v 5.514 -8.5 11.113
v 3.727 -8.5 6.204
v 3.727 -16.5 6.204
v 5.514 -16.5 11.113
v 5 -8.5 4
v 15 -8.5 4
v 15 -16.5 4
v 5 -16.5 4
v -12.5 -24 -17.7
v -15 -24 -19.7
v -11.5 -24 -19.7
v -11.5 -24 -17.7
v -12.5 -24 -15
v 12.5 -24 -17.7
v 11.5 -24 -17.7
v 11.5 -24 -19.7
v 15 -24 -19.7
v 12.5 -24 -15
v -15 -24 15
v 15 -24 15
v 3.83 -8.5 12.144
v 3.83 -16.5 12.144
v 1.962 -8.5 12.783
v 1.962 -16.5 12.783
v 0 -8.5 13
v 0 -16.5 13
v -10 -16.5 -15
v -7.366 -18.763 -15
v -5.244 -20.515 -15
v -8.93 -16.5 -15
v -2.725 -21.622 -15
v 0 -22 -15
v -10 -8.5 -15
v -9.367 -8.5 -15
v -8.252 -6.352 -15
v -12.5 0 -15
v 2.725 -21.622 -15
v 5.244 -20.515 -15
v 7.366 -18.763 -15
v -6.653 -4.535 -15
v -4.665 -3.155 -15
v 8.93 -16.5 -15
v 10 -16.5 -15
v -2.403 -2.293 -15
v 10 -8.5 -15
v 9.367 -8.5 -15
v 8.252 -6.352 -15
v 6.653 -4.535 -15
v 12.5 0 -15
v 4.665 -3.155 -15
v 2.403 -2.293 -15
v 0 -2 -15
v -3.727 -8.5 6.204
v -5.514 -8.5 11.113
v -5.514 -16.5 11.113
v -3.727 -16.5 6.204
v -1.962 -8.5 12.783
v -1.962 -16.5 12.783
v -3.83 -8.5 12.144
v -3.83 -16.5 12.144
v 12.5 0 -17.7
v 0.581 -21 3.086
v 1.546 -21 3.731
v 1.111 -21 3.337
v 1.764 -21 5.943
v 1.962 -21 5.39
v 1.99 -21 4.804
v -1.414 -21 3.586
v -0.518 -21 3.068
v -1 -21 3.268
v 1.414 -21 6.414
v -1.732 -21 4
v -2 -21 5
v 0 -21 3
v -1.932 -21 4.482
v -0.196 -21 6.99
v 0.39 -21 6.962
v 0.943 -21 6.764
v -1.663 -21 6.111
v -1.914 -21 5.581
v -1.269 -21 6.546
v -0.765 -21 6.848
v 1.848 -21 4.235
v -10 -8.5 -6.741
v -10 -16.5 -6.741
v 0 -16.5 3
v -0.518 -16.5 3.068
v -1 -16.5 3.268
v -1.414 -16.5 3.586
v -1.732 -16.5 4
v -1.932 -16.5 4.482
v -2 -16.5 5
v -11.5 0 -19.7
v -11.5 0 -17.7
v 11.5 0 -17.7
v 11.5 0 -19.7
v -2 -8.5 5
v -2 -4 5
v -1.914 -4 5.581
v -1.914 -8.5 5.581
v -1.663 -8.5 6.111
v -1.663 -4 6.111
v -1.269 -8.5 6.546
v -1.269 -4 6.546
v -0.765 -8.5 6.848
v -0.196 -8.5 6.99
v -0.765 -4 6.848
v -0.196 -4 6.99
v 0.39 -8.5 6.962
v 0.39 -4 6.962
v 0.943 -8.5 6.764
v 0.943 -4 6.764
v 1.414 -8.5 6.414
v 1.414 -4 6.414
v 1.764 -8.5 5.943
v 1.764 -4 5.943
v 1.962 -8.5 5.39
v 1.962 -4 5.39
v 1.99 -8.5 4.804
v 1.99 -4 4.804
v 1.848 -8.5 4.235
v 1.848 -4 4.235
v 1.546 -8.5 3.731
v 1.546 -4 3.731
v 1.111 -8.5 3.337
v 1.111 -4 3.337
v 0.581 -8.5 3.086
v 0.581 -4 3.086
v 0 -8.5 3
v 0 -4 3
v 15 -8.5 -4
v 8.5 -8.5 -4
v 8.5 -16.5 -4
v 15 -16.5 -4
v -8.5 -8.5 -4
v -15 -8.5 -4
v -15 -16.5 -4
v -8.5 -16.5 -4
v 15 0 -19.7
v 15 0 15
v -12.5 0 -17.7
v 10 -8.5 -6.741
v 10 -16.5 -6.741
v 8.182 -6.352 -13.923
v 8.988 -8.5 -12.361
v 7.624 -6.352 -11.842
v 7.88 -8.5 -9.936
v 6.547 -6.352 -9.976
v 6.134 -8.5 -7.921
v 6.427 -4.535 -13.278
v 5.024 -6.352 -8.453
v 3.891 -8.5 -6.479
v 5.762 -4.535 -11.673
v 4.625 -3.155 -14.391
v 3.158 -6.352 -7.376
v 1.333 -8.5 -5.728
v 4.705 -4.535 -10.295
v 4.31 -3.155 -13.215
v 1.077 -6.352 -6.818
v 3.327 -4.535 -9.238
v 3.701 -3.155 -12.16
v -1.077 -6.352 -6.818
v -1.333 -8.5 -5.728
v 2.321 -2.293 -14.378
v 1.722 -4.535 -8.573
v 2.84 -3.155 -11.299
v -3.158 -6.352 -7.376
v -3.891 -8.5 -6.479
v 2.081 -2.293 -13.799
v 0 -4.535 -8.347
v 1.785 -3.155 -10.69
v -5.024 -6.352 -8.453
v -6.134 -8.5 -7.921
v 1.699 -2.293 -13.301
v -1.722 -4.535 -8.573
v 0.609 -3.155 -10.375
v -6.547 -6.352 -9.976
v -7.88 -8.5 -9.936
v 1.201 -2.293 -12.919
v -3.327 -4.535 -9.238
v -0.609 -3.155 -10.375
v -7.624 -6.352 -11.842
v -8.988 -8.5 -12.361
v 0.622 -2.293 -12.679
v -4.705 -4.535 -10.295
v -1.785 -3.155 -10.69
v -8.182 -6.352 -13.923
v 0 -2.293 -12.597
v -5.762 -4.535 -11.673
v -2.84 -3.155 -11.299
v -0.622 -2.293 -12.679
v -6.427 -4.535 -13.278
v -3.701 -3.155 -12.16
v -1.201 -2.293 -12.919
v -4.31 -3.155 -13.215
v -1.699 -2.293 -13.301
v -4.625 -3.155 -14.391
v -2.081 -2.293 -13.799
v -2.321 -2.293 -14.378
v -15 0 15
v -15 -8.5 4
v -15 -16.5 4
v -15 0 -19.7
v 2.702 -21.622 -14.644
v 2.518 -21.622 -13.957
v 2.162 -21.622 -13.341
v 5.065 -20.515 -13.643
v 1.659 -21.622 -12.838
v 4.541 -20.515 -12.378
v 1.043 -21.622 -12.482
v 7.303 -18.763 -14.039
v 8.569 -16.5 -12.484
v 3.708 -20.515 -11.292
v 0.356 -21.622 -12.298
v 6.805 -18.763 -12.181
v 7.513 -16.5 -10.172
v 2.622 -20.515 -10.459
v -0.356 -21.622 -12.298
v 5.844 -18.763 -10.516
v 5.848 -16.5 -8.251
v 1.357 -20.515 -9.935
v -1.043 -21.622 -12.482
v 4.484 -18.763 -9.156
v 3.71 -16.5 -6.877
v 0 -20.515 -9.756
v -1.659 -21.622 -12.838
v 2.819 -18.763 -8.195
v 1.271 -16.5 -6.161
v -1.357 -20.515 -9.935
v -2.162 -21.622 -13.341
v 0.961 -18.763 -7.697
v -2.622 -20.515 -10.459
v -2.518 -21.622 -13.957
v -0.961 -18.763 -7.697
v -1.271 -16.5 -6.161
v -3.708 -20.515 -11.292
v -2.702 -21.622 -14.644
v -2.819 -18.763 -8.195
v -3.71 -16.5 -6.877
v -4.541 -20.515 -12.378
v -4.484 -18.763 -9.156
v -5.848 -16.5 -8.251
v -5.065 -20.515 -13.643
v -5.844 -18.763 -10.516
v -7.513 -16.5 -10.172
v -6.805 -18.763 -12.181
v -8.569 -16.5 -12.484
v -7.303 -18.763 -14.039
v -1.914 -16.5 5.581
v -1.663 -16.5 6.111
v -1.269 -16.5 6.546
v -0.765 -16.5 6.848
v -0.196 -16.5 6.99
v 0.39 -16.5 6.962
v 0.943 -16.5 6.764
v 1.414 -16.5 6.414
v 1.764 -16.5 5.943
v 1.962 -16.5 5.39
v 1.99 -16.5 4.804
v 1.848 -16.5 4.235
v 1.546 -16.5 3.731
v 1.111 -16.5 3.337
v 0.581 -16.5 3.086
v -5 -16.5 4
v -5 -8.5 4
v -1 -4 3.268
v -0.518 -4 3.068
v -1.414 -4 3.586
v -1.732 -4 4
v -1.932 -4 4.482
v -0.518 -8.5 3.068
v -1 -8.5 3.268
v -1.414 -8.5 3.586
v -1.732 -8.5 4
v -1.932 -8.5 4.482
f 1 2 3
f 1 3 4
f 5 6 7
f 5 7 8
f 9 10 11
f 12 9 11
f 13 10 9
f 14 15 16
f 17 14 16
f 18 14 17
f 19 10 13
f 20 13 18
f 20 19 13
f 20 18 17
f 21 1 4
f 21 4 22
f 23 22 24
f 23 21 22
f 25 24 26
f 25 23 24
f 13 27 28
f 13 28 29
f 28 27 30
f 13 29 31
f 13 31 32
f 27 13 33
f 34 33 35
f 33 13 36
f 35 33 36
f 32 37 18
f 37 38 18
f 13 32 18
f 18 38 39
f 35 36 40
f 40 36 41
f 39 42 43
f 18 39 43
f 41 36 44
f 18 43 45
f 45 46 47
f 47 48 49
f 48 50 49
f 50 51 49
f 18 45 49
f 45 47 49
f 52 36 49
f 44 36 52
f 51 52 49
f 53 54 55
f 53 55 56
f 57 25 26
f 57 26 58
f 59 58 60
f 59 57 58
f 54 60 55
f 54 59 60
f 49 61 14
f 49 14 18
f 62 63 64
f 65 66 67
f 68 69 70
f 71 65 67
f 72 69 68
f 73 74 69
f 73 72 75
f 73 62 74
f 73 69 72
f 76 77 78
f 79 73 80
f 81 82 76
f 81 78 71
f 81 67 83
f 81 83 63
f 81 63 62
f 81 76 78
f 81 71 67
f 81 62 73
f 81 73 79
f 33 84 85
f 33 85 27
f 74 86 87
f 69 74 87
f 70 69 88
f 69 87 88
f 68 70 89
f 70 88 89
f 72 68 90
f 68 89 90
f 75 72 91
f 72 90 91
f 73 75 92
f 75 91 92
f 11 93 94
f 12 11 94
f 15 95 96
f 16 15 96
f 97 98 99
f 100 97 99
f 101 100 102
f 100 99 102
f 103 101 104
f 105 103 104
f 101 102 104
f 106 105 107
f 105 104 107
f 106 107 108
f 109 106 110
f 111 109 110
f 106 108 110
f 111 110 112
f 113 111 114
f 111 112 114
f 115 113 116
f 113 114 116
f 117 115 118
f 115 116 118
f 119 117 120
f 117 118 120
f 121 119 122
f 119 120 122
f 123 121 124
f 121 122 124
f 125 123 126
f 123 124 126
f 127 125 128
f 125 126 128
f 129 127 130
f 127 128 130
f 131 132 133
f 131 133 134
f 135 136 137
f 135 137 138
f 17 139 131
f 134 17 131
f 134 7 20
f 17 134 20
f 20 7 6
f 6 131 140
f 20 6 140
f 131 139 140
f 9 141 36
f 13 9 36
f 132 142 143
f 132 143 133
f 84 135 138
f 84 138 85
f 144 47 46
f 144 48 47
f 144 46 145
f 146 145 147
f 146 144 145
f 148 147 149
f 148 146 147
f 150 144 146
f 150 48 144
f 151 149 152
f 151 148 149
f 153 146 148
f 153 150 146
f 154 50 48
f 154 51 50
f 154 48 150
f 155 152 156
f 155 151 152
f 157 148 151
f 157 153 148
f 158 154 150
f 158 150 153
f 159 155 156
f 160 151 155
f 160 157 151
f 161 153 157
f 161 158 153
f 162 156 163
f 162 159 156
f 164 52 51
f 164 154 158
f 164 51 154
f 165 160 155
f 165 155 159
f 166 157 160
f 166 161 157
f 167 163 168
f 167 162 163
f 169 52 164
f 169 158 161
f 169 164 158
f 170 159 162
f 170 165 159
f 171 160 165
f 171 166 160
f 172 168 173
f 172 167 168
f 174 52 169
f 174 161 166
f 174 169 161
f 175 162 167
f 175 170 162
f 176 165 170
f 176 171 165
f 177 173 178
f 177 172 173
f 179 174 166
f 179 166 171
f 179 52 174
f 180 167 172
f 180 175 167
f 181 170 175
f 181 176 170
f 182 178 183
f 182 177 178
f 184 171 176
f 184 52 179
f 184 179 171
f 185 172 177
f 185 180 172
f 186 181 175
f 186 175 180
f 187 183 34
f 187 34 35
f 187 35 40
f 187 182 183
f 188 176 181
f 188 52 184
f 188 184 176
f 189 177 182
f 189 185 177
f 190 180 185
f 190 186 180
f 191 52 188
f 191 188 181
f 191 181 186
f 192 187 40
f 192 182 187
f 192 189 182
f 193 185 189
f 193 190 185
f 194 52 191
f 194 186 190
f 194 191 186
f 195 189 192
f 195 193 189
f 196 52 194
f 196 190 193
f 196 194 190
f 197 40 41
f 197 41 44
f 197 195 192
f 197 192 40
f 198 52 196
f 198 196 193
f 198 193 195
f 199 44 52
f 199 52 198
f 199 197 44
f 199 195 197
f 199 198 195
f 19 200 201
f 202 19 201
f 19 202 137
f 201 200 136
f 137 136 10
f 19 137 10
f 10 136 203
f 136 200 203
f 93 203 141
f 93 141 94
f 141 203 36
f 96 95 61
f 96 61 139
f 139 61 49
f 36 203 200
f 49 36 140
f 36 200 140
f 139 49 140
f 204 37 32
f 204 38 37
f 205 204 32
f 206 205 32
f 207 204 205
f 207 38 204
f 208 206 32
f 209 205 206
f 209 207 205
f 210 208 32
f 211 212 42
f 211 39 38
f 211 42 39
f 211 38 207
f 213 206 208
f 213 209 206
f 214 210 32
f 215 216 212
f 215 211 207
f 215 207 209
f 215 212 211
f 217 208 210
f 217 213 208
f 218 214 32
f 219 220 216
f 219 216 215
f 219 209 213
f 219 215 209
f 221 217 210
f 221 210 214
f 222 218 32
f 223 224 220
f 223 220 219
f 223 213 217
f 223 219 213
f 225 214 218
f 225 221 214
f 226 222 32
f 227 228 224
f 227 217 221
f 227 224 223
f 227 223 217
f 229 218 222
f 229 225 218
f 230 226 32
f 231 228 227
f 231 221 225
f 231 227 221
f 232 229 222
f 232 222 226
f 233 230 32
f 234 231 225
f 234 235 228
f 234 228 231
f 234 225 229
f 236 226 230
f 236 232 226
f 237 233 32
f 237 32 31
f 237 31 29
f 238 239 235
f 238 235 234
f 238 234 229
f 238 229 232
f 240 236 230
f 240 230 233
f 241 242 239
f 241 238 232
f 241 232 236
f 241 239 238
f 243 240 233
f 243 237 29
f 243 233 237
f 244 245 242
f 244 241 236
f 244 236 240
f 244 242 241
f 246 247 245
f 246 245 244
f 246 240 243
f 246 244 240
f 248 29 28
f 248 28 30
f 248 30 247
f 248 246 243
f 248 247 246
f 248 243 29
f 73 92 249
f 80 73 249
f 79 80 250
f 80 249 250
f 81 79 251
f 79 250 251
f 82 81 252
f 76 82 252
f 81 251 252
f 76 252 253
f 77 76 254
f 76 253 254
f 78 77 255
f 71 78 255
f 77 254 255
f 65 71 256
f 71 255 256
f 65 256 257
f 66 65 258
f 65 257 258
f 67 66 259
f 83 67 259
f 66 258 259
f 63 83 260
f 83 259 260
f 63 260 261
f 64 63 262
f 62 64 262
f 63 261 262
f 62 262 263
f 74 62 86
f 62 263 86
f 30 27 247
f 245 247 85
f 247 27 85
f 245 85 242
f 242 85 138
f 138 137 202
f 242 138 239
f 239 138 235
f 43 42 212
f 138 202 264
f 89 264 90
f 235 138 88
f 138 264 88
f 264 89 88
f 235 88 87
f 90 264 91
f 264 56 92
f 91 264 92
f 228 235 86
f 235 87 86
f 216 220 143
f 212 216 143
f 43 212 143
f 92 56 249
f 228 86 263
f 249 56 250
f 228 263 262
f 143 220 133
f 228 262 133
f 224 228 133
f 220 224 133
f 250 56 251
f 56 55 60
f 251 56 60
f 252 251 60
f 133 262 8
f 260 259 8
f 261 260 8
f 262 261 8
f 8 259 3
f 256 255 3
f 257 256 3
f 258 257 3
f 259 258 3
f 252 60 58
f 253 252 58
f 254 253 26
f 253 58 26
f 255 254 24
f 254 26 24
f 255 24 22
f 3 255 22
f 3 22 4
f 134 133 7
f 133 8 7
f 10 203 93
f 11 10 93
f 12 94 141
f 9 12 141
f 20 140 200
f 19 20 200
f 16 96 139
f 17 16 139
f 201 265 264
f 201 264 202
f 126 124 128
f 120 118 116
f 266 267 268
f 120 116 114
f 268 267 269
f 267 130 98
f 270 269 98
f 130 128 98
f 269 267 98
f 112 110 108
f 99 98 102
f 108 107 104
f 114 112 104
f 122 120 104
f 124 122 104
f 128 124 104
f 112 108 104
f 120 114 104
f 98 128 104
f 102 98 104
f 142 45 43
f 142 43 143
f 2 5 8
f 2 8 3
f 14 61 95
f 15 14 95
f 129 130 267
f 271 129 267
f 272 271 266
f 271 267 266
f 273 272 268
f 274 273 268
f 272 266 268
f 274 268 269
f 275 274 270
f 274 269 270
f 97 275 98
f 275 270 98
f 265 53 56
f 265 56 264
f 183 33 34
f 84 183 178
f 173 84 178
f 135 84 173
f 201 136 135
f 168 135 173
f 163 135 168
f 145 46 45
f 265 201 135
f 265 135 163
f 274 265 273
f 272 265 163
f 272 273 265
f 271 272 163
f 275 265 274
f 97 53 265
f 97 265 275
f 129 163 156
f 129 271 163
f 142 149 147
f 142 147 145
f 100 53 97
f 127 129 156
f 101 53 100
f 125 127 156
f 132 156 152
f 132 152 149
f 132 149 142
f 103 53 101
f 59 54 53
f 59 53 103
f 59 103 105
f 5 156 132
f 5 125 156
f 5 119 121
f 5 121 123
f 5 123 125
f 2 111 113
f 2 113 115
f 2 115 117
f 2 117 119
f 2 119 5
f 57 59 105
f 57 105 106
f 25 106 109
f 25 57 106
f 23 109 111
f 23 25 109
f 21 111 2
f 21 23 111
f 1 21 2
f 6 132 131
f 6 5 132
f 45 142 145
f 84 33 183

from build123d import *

# Parameters (mm, degrees)
F0_W     = 5
F0_H     = 8
F0_H_2   = 11
F0_W_2   = 2.5
F0_H_3   = 2.7
F0_W_3   = 1.5
F1_DEPTH = 24
F4_START = 8.5
F4_DEPTH = 8
F6_START = -4
F6_DEPTH = 17


with BuildPart() as f1:
    # F0 (on Front) → F1 (new body)
    with BuildSketch(Plane.XZ):
        with Locations((-12.5, 0)):
            Rectangle(F0_W, F0_H)
        with Locations((12.5, 9.5)):
            Rectangle(F0_W, F0_H_2)
        with BuildLine():
            Line((10, 4), (10, 15))
            Line((10, 15), (0, 15))
            Line((0, 15), (0, 13))
            ThreePointArc((0, 13), (2.9140227369, 12.5151906314), (5.5141020242, 11.1129936642))
            Line((5.5141020242, 11.1129936642), (3.727430731, 6.2041546301))
            Line((3.727430731, 6.2041546301), (5, 4))
            Line((5, 4), (8.5, 4))
            Line((8.5, 4), (10, 4))
        make_face()
        Polygon((0, 0), (0, 1.9517640748), (-8.5, -4), (0, -4), align=None)
        Polygon((15, -19.7), (15, -17.7), (12.5, -17.7), (11.5, -17.7), (11.5, -19.7), align=None)
        Polygon((0, -4), (8.5, -4), (0, 1.9517640748), (0, 0), align=None)
        Polygon((10, -6.7414640249), (10, -4), (8.5, -4), align=None)
        with BuildLine():
            Line((0, 13), (0, 15))
            Line((0, 15), (-10, 15))
            Line((-10, 15), (-10, 4))
            Line((-10, 4), (-8.5, 4))
            Line((-8.5, 4), (-5, 4))
            Line((-5, 4), (-3.727430731, 6.2041546301))
            Line((-3.727430731, 6.2041546301), (-5.5141020242, 11.1129936642))
            ThreePointArc((-5.5141020242, 11.1129936642), (-2.9140227369, 12.5151906314), (0, 13))
        make_face()
        with Locations((13.75, -16.35)):
            Rectangle(F0_W_2, F0_H_3)
        Polygon((10, -6.7414640249), (8.5, -4), (0, -4), (0, -15), (10, -15), align=None)
        Polygon((15, -15), (15, -4), (10, -4), (10, -6.7414640249), (10, -15), (12.5, -15), align=None)
        Polygon((0, -15), (0, -4), (-8.5, -4), (-10, -6.7414640249), (-10, -15), align=None)
        with BuildLine():
            ThreePointArc((5.5141020242, 11.1129936642), (2.9140227369, 12.5151906314), (0, 13))
            Line((0, 13), (0, 4))
            Line((0, 4), (2.9251840539, 4))
            Line((2.9251840539, 4), (3.727430731, 6.2041546301))
            Line((3.727430731, 6.2041546301), (5.5141020242, 11.1129936642))
        make_face()
        with BuildLine():
            Line((0, 4), (0, 13))
            ThreePointArc((0, 13), (-2.9140227369, 12.5151906314), (-5.5141020242, 11.1129936642))
            Line((-5.5141020242, 11.1129936642), (-3.727430731, 6.2041546301))
            Line((-3.727430731, 6.2041546301), (-2.9251840539, 4))
            Line((-2.9251840539, 4), (0, 4))
        make_face()
        with Locations((12.5, 0)):
            Rectangle(F0_W, F0_H)
        Polygon((-11.5, -19.7), (-11.5, -17.7), (-12.5, -17.7), (-15, -17.7), (-15, -19.7), align=None)
        with Locations((9.25, 0)):
            Rectangle(F0_W_3, F0_H)
        Polygon((-5, 4), (-2.9251840539, 4), (-3.727430731, 6.2041546301), align=None)
        with Locations((-13.75, -16.35)):
            Rectangle(F0_W_2, F0_H_3)
        with Locations((-12.5, 9.5)):
            Rectangle(F0_W, F0_H_2)
        Polygon((-8.5, -4), (-10, -4), (-10, -6.7414640249), align=None)
        Polygon((8.5, -4), (8.5, 4), (5, 4), (2.9251840539, 4), (0, 1.9517640748), align=None)
        Polygon((-5, 4), (-8.5, 4), (-8.5, -4), (0, 1.9517640748), (-2.9251840539, 4), align=None)
        Polygon((2.9251840539, 4), (5, 4), (3.727430731, 6.2041546301), align=None)
        Polygon((2.9251840539, 4), (0, 4), (0, 1.9517640748), align=None)
        Polygon((0, 1.9517640748), (0, 4), (-2.9251840539, 4), align=None)
        with Locations((-9.25, 0)):
            Rectangle(F0_W_3, F0_H)
        Polygon((-10, -6.7414640249), (-10, -4), (-15, -4), (-15, -15), (-12.5, -15), (-10, -15), align=None)
    extrude(amount=F1_DEPTH)

    # F2 (on face) → F3 (revolve, cut)
    with BuildSketch(Plane(origin=(0, 0, -15), x_dir=(1, 0, 0), z_dir=(0, 0, -1))):
        with BuildLine():
            ThreePointArc((0, 22), (-10, 12), (0, 2))
            Line((0, 2), (0, 12))
            Line((0, 12), (0, 22))
        make_face()
    revolve(axis=Axis((0, -6, -15), (0, -1, 0)), mode=Mode.SUBTRACT)

    # F0 (on Front) → F4 (cut)
    with BuildSketch(Plane.XZ.offset(F4_START)):
        Polygon((10, -6.7414640249), (8.5, -4), (0, -4), (0, -15), (10, -15), align=None)
        Polygon((0, -4), (8.5, -4), (0, 1.9517640748), (0, 0), align=None)
        Polygon((8.5, -4), (8.5, 4), (5, 4), (2.9251840539, 4), (0, 1.9517640748), align=None)
        Polygon((2.9251840539, 4), (0, 4), (0, 1.9517640748), align=None)
        Polygon((0, 1.9517640748), (0, 4), (-2.9251840539, 4), align=None)
        Polygon((0, 0), (0, 1.9517640748), (-8.5, -4), (0, -4), align=None)
        Polygon((-5, 4), (-8.5, 4), (-8.5, -4), (0, 1.9517640748), (-2.9251840539, 4), align=None)
        with Locations((-9.25, 0)):
            Rectangle(F0_W_3, F0_H)
        with Locations((-12.5, 0)):
            Rectangle(F0_W, F0_H)
        with Locations((9.25, 0)):
            Rectangle(F0_W_3, F0_H)
        with Locations((12.5, 0)):
            Rectangle(F0_W, F0_H)
        with BuildLine():
            ThreePointArc((5.5141020242, 11.1129936642), (2.9140227369, 12.5151906314), (0, 13))
            Line((0, 13), (0, 4))
            Line((0, 4), (2.9251840539, 4))
            Line((2.9251840539, 4), (3.727430731, 6.2041546301))
            Line((3.727430731, 6.2041546301), (5.5141020242, 11.1129936642))
        make_face()
        with BuildLine():
            Line((0, 4), (0, 13))
            ThreePointArc((0, 13), (-2.9140227369, 12.5151906314), (-5.5141020242, 11.1129936642))
            Line((-5.5141020242, 11.1129936642), (-3.727430731, 6.2041546301))
            Line((-3.727430731, 6.2041546301), (-2.9251840539, 4))
            Line((-2.9251840539, 4), (0, 4))
        make_face()
        Polygon((0, -15), (0, -4), (-8.5, -4), (-10, -6.7414640249), (-10, -15), align=None)
        Polygon((2.9251840539, 4), (5, 4), (3.727430731, 6.2041546301), align=None)
        Polygon((-5, 4), (-2.9251840539, 4), (-3.727430731, 6.2041546301), align=None)
    extrude(amount=F4_DEPTH, mode=Mode.SUBTRACT)

    # F5 (on face) → F6 (cut)
    with BuildSketch(Plane(origin=(0, 0, 0), x_dir=(-1, 0, 0), z_dir=(0, 1, 0)).offset(F6_START)):
        with BuildLine():
            ThreePointArc((0, 3), (1.4142135624, 3.5857864376), (2, 5))
            ThreePointArc((2, 5), (-1.4142135624, 6.4142135624), (0, 3))
        make_face()
    extrude(amount=-F6_DEPTH, mode=Mode.SUBTRACT)


solid = f1.part
